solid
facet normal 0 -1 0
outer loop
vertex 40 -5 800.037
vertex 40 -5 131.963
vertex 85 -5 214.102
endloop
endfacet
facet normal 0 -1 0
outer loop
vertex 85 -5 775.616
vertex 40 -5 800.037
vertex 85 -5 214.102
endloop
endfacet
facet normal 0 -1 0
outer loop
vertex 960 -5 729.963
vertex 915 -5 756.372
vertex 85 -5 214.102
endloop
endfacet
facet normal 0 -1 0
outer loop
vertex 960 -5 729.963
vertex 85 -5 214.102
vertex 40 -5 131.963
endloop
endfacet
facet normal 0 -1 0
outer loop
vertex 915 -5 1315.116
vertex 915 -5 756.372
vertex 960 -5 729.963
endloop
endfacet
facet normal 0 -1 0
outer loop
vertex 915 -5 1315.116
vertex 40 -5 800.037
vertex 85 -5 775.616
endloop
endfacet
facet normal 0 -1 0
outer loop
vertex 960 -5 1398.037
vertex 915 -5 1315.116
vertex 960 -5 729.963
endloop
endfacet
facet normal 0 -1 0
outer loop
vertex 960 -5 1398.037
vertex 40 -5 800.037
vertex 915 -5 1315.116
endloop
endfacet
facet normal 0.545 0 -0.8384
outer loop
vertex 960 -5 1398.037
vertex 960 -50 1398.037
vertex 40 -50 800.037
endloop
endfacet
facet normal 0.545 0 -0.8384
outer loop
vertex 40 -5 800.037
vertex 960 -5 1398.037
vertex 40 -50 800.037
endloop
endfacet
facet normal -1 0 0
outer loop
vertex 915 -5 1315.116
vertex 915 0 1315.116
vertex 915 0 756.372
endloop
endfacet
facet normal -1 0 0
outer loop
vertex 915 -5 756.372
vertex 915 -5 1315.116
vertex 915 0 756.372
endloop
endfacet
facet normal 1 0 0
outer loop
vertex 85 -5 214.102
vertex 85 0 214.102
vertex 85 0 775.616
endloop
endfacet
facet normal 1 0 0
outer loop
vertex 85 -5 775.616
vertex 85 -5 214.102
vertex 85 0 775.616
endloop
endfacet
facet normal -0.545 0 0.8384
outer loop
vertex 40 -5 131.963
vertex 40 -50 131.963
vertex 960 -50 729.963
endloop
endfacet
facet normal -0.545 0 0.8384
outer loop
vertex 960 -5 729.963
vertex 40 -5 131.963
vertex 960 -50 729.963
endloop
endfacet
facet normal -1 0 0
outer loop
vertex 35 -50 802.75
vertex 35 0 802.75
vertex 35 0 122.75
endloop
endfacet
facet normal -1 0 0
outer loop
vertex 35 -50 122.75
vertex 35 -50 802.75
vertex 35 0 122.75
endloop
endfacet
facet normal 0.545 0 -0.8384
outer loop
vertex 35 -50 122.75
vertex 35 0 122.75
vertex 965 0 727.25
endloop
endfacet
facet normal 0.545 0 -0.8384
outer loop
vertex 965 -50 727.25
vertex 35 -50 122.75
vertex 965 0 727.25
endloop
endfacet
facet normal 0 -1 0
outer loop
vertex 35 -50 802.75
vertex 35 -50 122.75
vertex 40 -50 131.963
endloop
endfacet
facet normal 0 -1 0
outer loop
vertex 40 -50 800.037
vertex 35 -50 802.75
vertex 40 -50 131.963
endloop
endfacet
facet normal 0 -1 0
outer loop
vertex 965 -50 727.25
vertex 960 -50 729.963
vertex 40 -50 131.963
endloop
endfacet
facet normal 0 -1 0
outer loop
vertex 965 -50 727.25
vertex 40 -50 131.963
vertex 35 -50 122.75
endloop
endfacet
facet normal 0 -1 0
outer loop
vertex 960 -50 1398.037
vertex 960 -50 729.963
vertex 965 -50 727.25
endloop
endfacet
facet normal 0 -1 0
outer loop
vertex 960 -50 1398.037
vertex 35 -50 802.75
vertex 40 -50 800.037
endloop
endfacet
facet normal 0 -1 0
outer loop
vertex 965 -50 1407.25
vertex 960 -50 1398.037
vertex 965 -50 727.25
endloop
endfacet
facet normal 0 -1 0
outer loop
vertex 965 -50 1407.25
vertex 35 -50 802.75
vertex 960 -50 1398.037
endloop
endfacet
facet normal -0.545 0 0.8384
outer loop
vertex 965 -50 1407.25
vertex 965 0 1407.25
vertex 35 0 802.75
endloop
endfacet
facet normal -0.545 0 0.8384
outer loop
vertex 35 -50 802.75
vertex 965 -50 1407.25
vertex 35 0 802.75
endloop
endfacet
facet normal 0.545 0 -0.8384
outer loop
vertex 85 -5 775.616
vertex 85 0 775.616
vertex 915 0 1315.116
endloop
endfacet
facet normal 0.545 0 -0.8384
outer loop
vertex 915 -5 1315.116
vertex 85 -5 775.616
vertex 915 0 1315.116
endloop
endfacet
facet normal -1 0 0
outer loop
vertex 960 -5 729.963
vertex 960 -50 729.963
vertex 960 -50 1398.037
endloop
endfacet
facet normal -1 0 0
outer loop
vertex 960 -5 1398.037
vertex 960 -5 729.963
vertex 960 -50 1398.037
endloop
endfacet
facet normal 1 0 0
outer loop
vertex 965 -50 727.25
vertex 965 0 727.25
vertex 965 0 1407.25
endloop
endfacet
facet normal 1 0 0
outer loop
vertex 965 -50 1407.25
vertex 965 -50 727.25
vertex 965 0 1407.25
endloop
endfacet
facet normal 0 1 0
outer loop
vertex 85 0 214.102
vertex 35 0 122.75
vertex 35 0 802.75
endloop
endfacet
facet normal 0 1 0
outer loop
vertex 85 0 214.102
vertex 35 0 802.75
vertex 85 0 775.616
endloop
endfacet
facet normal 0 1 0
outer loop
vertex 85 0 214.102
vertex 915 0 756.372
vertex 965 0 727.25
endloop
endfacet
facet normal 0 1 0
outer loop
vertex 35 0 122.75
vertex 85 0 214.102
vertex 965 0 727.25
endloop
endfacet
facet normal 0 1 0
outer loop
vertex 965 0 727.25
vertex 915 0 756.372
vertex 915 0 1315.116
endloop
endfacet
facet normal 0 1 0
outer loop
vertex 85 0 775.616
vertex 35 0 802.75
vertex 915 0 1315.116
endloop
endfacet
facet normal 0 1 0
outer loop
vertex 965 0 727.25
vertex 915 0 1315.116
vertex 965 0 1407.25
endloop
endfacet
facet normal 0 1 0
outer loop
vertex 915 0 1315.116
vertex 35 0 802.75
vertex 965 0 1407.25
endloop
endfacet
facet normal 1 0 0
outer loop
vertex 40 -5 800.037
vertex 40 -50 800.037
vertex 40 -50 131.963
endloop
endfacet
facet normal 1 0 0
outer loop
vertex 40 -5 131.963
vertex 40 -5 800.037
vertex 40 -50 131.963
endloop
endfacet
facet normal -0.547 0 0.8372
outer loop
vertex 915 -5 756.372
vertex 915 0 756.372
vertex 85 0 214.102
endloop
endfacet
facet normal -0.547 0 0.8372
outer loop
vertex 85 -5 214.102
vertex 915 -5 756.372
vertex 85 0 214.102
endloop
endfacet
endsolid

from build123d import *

# Parameters (mm, degrees)
F1_DEPTH = 50
F3_DEPTH = 45


with BuildPart() as f1:
    # F0 (on Front) → F1 (new body)
    with BuildSketch(Plane.XZ):
        Polygon((35, 802.75), (35, 122.75), (965, 727.25), (965, 1407.25), align=None)
        Polygon((915, 756.371666), (85, 214.10179), (85, 775.615698), (915, 1315.115698), align=None, mode=Mode.SUBTRACT)
    extrude(amount=F1_DEPTH)

    # F2 (on face) → F3 (cut)
    with BuildSketch(Plane.XZ.offset(50)):
        Polygon((40, 800.03657), (40, 131.96343), (960, 729.96343), (960, 1398.03657), align=None)
    extrude(amount=-F3_DEPTH, mode=Mode.SUBTRACT)


solid = f1.part
